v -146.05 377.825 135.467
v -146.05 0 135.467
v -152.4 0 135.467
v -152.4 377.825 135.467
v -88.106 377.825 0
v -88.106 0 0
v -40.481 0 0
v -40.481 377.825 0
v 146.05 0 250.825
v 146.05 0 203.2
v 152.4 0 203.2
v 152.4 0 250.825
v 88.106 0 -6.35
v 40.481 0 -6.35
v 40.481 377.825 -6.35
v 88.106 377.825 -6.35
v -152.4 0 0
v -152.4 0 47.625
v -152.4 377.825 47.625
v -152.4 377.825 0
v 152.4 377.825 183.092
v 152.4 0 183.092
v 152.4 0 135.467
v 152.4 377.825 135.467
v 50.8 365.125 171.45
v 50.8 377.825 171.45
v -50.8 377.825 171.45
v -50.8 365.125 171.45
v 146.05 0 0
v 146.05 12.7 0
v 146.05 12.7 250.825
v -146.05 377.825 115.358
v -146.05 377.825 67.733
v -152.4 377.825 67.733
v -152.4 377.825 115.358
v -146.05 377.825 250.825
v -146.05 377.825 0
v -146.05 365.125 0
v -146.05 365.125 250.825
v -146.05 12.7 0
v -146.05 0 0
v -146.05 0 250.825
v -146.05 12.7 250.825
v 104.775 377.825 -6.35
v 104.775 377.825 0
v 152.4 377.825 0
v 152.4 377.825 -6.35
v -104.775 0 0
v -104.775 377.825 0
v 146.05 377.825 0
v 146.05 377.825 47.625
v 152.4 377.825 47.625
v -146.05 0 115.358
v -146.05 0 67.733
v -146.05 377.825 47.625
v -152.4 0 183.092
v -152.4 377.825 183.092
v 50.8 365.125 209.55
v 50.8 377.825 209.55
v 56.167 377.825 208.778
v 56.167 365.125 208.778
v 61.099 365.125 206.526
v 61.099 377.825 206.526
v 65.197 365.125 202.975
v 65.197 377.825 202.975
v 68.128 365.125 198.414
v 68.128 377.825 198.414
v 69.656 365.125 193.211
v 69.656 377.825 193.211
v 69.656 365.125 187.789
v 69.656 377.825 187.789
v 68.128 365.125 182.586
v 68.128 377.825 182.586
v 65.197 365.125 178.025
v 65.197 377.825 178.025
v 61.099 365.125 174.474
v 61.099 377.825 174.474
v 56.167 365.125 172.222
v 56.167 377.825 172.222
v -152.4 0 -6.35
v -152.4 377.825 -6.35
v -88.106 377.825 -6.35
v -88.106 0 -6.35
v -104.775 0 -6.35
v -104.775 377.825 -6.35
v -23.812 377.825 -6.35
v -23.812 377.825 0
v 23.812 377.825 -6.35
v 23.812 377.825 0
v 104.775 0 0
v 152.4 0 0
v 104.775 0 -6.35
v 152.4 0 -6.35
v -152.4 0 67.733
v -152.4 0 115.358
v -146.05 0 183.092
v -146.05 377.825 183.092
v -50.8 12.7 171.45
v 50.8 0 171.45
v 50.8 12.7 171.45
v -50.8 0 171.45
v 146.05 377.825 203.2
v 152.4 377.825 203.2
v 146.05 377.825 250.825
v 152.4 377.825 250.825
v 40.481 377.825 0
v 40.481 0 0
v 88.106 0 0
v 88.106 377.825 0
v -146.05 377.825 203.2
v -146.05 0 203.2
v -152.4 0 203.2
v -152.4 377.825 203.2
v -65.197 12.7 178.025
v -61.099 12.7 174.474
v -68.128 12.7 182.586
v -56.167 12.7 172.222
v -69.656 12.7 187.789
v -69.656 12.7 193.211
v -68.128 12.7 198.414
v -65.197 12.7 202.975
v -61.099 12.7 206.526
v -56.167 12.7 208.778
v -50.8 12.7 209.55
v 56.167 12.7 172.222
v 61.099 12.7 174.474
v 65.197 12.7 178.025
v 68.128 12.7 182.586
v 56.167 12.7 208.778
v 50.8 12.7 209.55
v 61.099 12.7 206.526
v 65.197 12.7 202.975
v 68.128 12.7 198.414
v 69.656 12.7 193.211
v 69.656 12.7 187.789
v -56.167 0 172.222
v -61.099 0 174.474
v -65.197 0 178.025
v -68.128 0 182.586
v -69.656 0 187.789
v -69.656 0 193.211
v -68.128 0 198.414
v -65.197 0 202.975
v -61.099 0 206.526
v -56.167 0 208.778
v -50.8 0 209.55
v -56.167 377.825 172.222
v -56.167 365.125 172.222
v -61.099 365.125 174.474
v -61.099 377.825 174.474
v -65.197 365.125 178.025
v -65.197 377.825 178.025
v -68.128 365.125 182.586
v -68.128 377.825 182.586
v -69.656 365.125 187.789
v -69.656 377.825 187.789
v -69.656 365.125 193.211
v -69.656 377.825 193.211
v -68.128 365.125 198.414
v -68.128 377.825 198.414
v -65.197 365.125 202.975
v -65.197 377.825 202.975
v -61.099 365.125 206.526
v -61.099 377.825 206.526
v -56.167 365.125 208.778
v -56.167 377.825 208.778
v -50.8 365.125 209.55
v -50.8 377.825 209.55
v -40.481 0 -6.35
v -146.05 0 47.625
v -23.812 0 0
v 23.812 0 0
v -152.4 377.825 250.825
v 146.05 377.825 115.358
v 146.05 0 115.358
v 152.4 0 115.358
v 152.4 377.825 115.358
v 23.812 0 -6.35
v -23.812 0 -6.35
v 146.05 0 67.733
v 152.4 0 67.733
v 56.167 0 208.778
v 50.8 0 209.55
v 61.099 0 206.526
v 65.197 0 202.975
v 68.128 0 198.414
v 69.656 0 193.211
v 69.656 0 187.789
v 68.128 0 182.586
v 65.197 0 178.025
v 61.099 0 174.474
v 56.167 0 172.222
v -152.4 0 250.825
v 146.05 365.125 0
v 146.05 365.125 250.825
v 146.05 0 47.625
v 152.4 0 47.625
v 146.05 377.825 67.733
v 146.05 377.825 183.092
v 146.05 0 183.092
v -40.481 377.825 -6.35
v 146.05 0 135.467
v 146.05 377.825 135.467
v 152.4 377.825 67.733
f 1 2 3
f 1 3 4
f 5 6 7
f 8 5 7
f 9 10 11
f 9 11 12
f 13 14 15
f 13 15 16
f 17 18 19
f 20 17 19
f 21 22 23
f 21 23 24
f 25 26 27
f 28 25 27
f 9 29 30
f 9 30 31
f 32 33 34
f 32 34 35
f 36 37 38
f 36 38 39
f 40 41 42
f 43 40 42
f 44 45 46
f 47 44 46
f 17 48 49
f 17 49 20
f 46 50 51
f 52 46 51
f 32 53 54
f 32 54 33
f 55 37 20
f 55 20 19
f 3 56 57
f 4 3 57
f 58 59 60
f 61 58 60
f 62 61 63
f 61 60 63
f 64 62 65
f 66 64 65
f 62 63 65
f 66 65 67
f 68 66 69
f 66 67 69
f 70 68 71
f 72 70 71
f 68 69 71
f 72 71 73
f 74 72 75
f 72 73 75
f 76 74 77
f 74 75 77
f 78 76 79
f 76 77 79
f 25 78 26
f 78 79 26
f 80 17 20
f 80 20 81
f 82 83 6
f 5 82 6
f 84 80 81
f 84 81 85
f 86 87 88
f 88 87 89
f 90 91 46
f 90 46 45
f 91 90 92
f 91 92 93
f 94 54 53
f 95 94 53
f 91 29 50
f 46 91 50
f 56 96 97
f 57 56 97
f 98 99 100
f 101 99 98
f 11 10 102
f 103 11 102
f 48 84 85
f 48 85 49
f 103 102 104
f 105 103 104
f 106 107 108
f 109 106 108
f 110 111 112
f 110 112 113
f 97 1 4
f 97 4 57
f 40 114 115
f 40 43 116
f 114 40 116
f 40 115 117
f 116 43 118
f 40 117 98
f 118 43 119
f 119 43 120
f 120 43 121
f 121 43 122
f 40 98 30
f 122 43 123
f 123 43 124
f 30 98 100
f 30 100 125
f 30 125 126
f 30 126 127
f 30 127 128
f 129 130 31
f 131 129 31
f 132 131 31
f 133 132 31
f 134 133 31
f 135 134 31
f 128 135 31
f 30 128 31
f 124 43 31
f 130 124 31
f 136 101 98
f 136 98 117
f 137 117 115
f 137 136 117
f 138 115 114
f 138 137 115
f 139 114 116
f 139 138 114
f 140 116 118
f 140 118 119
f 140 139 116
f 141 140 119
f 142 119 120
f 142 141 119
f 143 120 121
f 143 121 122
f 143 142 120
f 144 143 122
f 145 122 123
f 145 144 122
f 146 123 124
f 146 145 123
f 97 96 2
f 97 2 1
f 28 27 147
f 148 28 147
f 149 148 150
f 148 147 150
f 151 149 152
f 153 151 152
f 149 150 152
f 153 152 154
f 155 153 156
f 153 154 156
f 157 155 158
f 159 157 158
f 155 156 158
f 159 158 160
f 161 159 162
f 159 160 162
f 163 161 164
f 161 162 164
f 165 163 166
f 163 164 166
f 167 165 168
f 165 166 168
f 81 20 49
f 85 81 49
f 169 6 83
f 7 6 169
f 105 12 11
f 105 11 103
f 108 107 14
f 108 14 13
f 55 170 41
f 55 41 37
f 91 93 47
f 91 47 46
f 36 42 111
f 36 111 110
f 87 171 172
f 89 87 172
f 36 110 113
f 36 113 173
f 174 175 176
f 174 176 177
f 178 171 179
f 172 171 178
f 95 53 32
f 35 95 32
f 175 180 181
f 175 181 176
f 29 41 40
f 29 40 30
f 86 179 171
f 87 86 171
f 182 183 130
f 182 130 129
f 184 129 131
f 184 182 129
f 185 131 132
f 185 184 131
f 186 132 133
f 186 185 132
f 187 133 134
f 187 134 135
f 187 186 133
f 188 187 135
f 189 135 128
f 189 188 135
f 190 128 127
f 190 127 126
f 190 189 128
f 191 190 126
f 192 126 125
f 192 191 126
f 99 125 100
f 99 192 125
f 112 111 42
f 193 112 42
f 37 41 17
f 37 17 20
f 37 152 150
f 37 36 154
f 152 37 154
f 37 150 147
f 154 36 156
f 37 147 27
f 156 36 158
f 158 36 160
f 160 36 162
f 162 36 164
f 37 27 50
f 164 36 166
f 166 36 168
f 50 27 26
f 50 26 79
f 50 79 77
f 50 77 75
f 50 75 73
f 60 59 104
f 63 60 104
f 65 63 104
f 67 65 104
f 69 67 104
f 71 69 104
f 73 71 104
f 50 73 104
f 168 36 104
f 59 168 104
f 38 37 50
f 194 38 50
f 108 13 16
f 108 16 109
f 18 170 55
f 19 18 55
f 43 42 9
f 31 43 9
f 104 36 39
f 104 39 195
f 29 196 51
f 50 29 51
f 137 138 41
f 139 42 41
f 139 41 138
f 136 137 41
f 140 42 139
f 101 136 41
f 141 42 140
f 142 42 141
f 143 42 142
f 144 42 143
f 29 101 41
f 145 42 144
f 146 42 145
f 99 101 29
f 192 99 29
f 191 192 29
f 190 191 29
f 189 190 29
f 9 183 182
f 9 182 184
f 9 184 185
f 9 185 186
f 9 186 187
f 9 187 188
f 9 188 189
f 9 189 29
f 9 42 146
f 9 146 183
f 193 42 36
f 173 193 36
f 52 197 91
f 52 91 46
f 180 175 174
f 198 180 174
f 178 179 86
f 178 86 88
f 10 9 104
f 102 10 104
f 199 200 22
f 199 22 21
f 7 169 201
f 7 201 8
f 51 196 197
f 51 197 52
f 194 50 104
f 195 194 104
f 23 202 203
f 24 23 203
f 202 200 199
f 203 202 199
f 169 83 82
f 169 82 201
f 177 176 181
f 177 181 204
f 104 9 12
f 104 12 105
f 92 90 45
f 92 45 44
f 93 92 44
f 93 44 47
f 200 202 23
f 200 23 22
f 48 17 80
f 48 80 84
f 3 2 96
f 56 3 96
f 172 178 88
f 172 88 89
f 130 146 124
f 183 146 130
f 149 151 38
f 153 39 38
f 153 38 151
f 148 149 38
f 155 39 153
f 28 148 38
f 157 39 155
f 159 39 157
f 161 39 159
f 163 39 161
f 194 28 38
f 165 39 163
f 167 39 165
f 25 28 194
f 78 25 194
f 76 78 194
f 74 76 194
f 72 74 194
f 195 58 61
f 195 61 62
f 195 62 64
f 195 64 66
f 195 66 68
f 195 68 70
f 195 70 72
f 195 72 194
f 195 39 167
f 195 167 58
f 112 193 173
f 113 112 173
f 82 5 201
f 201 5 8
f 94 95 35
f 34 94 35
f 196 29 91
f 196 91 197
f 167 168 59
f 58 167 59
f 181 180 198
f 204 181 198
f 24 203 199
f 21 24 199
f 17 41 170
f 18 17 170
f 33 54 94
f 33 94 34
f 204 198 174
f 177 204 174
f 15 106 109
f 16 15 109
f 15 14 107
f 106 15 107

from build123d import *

# Parameters (mm, degrees)
F0_W     = 292.1
F0_H     = 250.825
F1_DEPTH = 12.7
F4_W     = 377.825
F4_H     = 47.625
F5_DEPTH = 6.35
F8_DEPTH = 377.825
F7_W     = 47.625
F7_H     = 6.35


with BuildPart() as f1:
    # F0 (on Front) → F1 (new body)
    with BuildSketch(Plane.XZ):
        with Locations((0, 125.4125)):
            Rectangle(F0_W, F0_H)
        with BuildLine():
            ThreePointArc((-50.8, 171.45), (-69.85, 190.5), (-50.8, 209.55))
            Line((-50.8, 209.55), (50.8, 209.55))
            ThreePointArc((50.8, 209.55), (69.85, 190.5), (50.8, 171.45))
            Line((50.8, 171.45), (-50.8, 171.45))
        make_face(mode=Mode.SUBTRACT)
    extrude(amount=-F1_DEPTH)


with BuildPart() as f3_1:
    # F3: instance of F1
    add(f1.part.mirror(Plane(origin=(0, 188.9125, 120.6339904822), x_dir=(1, 0, 0), z_dir=(0, -1, 0))))


with BuildPart() as f5:
    # F4 (on face) → F5 (new body)
    with BuildSketch(Plane.YZ.offset(146.05)):
        with Locations((188.9125, 23.8125)):
            Rectangle(F4_W, F4_H)
    extrude(amount=F5_DEPTH)


with BuildPart() as f5b:
    # F4 (on face) → F5, piece 2 (new body)
    with BuildSketch(Plane.YZ.offset(146.05)):
        with Locations((188.9125, 227.0125)):
            Rectangle(F4_W, F4_H)
    extrude(amount=F5_DEPTH)


with BuildPart() as f5c:
    # F4 (on face) → F5, piece 3 (new body)
    with BuildSketch(Plane.YZ.offset(146.05)):
        with Locations((188.9125, 91.5458333333)):
            Rectangle(F4_W, F4_H)
    extrude(amount=F5_DEPTH)


with BuildPart() as f5d:
    # F4 (on face) → F5, piece 4 (new body)
    with BuildSketch(Plane.YZ.offset(146.05)):
        with Locations((188.9125, 159.2791666667)):
            Rectangle(F4_W, F4_H)
    extrude(amount=F5_DEPTH)


with BuildPart() as f6_1:
    # F6: instance of F5d
    add(f5d.part.mirror(Plane.YZ))


with BuildPart() as f6_2:
    # F6: instance of F5b
    add(f5b.part.mirror(Plane.YZ))


with BuildPart() as f6_3:
    # F6: instance of F5c
    add(f5c.part.mirror(Plane.YZ))


with BuildPart() as f6_4:
    # F6: instance of F5
    add(f5.part.mirror(Plane.YZ))


with BuildPart() as f8:
    # F7 (on face) → F8 (new body, through all)
    with BuildSketch(Plane.XZ):
        Polygon((-104.775, 0), (-146.05, 0), (-152.4, 0), (-152.4, -6.35), (-104.775, -6.35), align=None)
    extrude(amount=-F8_DEPTH)


with BuildPart() as f8b:
    # F7 (on face) → F8, piece 2 (new body, through all)
    with BuildSketch(Plane.XZ):
        Polygon((152.4, -6.35), (152.4, 0), (146.05, 0), (104.775, 0), (104.775, -6.35), align=None)
    extrude(amount=-F8_DEPTH)


with BuildPart() as f8c:
    # F7 (on face) → F8, piece 3 (new body, through all)
    with BuildSketch(Plane.XZ):
        with Locations((64.29375, -3.175)):
            Rectangle(F7_W, F7_H)
    extrude(amount=-F8_DEPTH)


with BuildPart() as f8d:
    # F7 (on face) → F8, piece 4 (new body, through all)
    with BuildSketch(Plane.XZ):
        with Locations((0, -3.175)):
            Rectangle(F7_W, F7_H)
    extrude(amount=-F8_DEPTH)


with BuildPart() as f8e:
    # F7 (on face) → F8, piece 5 (new body, through all)
    with BuildSketch(Plane.XZ):
        with Locations((-64.29375, -3.175)):
            Rectangle(F7_W, F7_H)
    extrude(amount=-F8_DEPTH)


solid = Compound([f1.part, f3_1.part, f5.part, f5b.part, f5c.part, f5d.part, f6_1.part, f6_2.part, f6_3.part, f6_4.part, f8.part, f8b.part, f8c.part, f8d.part, f8e.part])
